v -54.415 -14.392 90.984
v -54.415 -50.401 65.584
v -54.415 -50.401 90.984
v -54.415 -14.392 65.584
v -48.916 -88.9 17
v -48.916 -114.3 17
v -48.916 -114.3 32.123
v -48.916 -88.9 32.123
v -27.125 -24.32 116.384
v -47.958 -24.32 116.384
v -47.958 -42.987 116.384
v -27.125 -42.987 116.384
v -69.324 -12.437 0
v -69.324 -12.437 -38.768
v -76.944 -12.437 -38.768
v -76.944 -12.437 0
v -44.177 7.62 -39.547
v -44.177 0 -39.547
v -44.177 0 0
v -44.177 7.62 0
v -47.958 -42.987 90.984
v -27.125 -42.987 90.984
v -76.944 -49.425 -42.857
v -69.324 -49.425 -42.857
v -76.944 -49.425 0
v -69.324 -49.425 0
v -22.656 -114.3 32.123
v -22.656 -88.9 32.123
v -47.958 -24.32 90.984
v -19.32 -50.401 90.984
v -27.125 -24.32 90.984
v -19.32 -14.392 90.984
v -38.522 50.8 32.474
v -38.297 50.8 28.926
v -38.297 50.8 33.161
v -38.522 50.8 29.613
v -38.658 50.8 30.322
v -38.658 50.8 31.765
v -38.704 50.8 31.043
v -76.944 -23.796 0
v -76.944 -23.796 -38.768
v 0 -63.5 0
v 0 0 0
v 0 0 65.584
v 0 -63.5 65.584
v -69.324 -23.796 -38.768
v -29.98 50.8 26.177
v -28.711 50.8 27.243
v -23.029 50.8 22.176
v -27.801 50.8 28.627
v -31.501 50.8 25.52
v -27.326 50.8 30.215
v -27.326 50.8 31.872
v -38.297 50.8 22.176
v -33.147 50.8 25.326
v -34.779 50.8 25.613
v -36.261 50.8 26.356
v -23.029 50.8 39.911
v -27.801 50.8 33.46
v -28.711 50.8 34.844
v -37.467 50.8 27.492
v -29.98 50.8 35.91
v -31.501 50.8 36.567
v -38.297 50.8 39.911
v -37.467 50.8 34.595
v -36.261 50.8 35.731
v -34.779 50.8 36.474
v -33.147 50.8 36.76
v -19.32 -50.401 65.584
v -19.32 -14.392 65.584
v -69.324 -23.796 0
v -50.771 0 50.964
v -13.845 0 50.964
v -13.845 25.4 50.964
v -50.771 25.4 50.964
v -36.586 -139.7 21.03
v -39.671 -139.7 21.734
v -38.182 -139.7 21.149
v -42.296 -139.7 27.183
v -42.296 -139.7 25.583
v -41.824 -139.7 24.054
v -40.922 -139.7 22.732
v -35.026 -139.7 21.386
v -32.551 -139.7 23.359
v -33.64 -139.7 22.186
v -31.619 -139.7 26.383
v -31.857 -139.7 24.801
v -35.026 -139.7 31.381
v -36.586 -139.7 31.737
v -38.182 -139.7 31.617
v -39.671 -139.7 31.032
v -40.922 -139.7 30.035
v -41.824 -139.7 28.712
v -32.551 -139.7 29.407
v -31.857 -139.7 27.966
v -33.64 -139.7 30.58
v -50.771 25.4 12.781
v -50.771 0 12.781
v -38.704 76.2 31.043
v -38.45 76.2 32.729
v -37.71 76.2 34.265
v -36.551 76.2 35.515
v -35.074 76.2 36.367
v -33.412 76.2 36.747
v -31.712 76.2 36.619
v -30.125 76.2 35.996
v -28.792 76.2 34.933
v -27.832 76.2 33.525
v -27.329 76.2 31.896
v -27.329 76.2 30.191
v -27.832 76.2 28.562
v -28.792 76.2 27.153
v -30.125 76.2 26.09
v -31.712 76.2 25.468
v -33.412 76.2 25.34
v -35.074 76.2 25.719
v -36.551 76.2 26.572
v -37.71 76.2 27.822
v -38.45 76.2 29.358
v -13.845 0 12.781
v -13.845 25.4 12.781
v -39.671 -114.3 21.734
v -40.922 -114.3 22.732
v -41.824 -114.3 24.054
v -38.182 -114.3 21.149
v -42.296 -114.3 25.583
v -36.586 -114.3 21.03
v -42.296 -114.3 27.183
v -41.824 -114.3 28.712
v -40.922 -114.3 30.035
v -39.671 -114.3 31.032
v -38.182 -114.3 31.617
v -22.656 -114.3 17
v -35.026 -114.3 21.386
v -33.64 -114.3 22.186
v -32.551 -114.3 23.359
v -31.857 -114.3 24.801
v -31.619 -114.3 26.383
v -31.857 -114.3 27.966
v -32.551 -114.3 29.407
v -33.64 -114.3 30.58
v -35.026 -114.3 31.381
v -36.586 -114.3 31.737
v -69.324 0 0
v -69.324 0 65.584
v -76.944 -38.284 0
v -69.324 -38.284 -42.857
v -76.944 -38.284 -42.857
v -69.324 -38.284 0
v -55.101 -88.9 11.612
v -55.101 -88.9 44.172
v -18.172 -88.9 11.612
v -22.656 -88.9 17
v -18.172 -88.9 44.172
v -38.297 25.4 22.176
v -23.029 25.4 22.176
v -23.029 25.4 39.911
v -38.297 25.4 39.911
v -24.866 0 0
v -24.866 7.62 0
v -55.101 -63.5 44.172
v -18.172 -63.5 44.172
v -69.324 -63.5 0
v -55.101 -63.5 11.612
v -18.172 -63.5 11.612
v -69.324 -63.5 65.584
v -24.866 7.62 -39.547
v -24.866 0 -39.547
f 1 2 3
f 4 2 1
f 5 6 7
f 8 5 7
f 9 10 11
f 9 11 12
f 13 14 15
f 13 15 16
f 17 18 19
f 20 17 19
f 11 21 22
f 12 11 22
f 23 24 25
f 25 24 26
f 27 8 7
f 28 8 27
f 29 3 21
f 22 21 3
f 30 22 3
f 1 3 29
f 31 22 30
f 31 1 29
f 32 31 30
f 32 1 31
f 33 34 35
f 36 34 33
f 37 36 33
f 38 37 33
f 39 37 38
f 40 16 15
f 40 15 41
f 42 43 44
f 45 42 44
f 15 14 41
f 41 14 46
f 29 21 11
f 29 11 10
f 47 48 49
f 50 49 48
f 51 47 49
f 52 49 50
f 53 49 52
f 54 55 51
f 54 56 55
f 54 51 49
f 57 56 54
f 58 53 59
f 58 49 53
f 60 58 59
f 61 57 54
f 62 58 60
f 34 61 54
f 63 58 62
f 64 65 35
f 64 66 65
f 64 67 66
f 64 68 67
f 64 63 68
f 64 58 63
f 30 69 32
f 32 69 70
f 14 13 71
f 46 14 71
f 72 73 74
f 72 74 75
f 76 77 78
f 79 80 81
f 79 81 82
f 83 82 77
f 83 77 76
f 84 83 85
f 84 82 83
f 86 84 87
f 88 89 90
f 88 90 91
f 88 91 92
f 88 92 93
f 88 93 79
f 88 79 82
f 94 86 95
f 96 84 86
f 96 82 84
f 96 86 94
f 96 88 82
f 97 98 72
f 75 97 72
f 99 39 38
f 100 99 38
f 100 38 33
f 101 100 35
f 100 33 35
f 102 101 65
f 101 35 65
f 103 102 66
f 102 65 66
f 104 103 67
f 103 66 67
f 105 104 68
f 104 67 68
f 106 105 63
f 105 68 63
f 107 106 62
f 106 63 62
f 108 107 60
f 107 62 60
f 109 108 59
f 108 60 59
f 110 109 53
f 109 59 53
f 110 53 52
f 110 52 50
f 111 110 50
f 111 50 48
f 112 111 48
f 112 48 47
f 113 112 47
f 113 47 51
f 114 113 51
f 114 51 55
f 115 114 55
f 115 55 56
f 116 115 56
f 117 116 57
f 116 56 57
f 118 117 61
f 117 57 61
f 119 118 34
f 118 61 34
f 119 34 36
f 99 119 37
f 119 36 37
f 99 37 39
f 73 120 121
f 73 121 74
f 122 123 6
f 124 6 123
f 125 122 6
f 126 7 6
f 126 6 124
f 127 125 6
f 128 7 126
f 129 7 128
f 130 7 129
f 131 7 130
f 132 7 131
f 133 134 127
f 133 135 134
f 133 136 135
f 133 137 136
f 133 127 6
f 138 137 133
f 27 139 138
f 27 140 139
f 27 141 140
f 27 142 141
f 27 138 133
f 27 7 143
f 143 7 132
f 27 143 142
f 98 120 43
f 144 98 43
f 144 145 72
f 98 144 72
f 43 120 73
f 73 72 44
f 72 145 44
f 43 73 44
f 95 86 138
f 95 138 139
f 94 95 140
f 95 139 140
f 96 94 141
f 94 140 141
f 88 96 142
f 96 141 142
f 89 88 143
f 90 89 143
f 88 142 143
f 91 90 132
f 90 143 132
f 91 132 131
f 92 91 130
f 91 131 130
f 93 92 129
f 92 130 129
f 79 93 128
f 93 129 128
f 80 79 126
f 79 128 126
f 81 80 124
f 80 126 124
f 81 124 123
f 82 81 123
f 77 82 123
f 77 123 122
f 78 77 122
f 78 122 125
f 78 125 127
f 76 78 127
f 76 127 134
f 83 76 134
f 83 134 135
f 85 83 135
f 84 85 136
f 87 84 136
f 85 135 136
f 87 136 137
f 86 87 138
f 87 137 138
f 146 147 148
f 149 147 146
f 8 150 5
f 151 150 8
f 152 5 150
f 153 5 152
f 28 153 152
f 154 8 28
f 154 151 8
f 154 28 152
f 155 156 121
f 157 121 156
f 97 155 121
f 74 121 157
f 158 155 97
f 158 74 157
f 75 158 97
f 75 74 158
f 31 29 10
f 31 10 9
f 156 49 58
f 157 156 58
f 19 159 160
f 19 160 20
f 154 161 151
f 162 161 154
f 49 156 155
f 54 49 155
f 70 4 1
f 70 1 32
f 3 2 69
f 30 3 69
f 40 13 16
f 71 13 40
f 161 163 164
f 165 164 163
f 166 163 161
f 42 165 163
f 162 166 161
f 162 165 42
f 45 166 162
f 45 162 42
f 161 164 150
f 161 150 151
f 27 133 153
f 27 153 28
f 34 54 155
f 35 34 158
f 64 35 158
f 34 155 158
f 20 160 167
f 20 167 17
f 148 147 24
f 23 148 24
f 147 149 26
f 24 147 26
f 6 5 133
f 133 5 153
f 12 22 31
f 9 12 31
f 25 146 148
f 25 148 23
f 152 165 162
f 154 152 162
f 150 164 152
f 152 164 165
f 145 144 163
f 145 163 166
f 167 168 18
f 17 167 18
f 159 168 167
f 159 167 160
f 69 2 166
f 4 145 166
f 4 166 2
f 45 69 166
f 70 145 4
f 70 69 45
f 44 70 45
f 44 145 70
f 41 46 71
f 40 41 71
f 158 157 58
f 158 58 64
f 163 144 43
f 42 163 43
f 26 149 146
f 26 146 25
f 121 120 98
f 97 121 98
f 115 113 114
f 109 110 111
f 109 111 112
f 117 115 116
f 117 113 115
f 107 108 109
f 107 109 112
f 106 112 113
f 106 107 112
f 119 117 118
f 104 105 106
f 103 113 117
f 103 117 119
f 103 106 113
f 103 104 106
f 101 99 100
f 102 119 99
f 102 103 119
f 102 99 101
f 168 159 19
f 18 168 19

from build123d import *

# Parameters (mm, degrees)
F0_W      = 69.3235993385
F0_H      = 65.5840709805
F1_DEPTH  = 63.5
F2_W      = 35.0951533765
F2_H      = 36.0083952546
F3_DEPTH  = 25.4
F4_W      = 20.8325367421
F4_H      = 18.6669826508
F5_DEPTH  = 25.4
F6_W      = 36.92862764
F6_H      = 32.5597869232
F7_DEPTH  = 25.4
F8_W      = 26.2603592128
F8_H      = 15.1235517114
F9_DEPTH  = 25.4
F10_R     = 5.3684769187
F11_DEPTH = 25.4
F12_W     = 36.9260255247
F12_H     = 38.1826851517
F13_DEPTH = 25.4
F14_W     = 15.2680147439
F14_H     = 17.734348774
F15_DEPTH = 25.4
F16_R     = 5.7192669118
F17_DEPTH = 25.4
F18_W     = 11.3583598286
F18_H     = 38.7682840228
F19_DEPTH = 7.62
F20_W     = 11.1404322088
F20_H     = 42.8567491472
F21_DEPTH = 7.62
F22_W     = 19.3107295781
F22_H     = 39.5472832024
F23_DEPTH = 7.62


with BuildPart() as f1:
    # F0 (on Front) → F1 (new body)
    with BuildSketch(Plane.XZ):
        with Locations((-34.6617996693, 32.7920354903)):
            Rectangle(F0_W, F0_H)
    extrude(amount=F1_DEPTH)

    # F2 (on face) → F3 (join)
    with BuildSketch(Plane.XY.offset(65.5840709805)):
        with Locations((-36.8673438206, -32.3964692652)):
            Rectangle(F2_W, F2_H)
    extrude(amount=F3_DEPTH)

    # F4 (on face) → F5 (join)
    with BuildSketch(Plane.XY.offset(90.9840709805)):
        with Locations((-37.5416250899, -33.6531102657)):
            Rectangle(F4_W, F4_H)
    extrude(amount=F5_DEPTH)

    # F6 (on face) → F7 (join)
    with BuildSketch(Plane.XZ.offset(63.5)):
        with Locations((-36.6367865354, 27.891756501)):
            Rectangle(F6_W, F6_H)
    extrude(amount=F7_DEPTH)

    # F8 (on face) → F9 (join)
    with BuildSketch(Plane.XZ.offset(88.9)):
        with Locations((-35.7861341909, 24.5613688603)):
            Rectangle(F8_W, F8_H)
    extrude(amount=F9_DEPTH)

    # F10 (on face) → F11 (join)
    with BuildSketch(Plane.XZ.offset(114.3)):
        with Locations((-36.9870662689, 26.3831857592)):
            Circle(F10_R)
    extrude(amount=F11_DEPTH)

    # F12 (on face) → F13 (join)
    with BuildSketch(Plane(origin=(0, 0, 0), x_dir=(-1, 0, 0), z_dir=(0, 1, 0))):
        with Locations((32.3077207431, 31.8722119555)):
            Rectangle(F12_W, F12_H)
    extrude(amount=F13_DEPTH)

    # F14 (on face) → F15 (join)
    with BuildSketch(Plane(origin=(0, 25.4, 0), x_dir=(-1, 0, 0), z_dir=(0, 1, 0))):
        with Locations((30.6634595618, 31.0434103012)):
            Rectangle(F14_W, F14_H)
    extrude(amount=F15_DEPTH)

    # F16 (on face) → F17 (join)
    with BuildSketch(Plane(origin=(0, 50.8, 0), x_dir=(-1, 0, 0), z_dir=(0, 1, 0))):
        with Locations((32.9846180975, 31.0434103012)):
            Circle(F16_R)
    extrude(amount=F17_DEPTH)


with BuildPart() as f19:
    # F18 (on face) → F19 (new body)
    with BuildSketch(Plane(origin=(-69.3235993385, 0, 0), x_dir=(0, -1, 0), z_dir=(-1, 0, 0))):
        with Locations((18.1166036054, -19.3841420114)):
            Rectangle(F18_W, F18_H)
    extrude(amount=F19_DEPTH)


with BuildPart() as f21:
    # F20 (on face) → F21 (new body)
    with BuildSketch(Plane(origin=(-69.3235993385, 0, 0), x_dir=(0, -1, 0), z_dir=(-1, 0, 0))):
        with Locations((43.854566291, -21.4283745736)):
            Rectangle(F20_W, F20_H)
    extrude(amount=F21_DEPTH)


with BuildPart() as f23:
    # F22 (on face) → F23 (new body)
    with BuildSketch(Plane(origin=(0, 0, 0), x_dir=(-1, 0, 0), z_dir=(0, 1, 0))):
        with Locations((34.5218433067, -19.7736416012)):
            Rectangle(F22_W, F22_H)
    extrude(amount=F23_DEPTH)


solid = Compound([f1.part, f19.part, f21.part, f23.part])
